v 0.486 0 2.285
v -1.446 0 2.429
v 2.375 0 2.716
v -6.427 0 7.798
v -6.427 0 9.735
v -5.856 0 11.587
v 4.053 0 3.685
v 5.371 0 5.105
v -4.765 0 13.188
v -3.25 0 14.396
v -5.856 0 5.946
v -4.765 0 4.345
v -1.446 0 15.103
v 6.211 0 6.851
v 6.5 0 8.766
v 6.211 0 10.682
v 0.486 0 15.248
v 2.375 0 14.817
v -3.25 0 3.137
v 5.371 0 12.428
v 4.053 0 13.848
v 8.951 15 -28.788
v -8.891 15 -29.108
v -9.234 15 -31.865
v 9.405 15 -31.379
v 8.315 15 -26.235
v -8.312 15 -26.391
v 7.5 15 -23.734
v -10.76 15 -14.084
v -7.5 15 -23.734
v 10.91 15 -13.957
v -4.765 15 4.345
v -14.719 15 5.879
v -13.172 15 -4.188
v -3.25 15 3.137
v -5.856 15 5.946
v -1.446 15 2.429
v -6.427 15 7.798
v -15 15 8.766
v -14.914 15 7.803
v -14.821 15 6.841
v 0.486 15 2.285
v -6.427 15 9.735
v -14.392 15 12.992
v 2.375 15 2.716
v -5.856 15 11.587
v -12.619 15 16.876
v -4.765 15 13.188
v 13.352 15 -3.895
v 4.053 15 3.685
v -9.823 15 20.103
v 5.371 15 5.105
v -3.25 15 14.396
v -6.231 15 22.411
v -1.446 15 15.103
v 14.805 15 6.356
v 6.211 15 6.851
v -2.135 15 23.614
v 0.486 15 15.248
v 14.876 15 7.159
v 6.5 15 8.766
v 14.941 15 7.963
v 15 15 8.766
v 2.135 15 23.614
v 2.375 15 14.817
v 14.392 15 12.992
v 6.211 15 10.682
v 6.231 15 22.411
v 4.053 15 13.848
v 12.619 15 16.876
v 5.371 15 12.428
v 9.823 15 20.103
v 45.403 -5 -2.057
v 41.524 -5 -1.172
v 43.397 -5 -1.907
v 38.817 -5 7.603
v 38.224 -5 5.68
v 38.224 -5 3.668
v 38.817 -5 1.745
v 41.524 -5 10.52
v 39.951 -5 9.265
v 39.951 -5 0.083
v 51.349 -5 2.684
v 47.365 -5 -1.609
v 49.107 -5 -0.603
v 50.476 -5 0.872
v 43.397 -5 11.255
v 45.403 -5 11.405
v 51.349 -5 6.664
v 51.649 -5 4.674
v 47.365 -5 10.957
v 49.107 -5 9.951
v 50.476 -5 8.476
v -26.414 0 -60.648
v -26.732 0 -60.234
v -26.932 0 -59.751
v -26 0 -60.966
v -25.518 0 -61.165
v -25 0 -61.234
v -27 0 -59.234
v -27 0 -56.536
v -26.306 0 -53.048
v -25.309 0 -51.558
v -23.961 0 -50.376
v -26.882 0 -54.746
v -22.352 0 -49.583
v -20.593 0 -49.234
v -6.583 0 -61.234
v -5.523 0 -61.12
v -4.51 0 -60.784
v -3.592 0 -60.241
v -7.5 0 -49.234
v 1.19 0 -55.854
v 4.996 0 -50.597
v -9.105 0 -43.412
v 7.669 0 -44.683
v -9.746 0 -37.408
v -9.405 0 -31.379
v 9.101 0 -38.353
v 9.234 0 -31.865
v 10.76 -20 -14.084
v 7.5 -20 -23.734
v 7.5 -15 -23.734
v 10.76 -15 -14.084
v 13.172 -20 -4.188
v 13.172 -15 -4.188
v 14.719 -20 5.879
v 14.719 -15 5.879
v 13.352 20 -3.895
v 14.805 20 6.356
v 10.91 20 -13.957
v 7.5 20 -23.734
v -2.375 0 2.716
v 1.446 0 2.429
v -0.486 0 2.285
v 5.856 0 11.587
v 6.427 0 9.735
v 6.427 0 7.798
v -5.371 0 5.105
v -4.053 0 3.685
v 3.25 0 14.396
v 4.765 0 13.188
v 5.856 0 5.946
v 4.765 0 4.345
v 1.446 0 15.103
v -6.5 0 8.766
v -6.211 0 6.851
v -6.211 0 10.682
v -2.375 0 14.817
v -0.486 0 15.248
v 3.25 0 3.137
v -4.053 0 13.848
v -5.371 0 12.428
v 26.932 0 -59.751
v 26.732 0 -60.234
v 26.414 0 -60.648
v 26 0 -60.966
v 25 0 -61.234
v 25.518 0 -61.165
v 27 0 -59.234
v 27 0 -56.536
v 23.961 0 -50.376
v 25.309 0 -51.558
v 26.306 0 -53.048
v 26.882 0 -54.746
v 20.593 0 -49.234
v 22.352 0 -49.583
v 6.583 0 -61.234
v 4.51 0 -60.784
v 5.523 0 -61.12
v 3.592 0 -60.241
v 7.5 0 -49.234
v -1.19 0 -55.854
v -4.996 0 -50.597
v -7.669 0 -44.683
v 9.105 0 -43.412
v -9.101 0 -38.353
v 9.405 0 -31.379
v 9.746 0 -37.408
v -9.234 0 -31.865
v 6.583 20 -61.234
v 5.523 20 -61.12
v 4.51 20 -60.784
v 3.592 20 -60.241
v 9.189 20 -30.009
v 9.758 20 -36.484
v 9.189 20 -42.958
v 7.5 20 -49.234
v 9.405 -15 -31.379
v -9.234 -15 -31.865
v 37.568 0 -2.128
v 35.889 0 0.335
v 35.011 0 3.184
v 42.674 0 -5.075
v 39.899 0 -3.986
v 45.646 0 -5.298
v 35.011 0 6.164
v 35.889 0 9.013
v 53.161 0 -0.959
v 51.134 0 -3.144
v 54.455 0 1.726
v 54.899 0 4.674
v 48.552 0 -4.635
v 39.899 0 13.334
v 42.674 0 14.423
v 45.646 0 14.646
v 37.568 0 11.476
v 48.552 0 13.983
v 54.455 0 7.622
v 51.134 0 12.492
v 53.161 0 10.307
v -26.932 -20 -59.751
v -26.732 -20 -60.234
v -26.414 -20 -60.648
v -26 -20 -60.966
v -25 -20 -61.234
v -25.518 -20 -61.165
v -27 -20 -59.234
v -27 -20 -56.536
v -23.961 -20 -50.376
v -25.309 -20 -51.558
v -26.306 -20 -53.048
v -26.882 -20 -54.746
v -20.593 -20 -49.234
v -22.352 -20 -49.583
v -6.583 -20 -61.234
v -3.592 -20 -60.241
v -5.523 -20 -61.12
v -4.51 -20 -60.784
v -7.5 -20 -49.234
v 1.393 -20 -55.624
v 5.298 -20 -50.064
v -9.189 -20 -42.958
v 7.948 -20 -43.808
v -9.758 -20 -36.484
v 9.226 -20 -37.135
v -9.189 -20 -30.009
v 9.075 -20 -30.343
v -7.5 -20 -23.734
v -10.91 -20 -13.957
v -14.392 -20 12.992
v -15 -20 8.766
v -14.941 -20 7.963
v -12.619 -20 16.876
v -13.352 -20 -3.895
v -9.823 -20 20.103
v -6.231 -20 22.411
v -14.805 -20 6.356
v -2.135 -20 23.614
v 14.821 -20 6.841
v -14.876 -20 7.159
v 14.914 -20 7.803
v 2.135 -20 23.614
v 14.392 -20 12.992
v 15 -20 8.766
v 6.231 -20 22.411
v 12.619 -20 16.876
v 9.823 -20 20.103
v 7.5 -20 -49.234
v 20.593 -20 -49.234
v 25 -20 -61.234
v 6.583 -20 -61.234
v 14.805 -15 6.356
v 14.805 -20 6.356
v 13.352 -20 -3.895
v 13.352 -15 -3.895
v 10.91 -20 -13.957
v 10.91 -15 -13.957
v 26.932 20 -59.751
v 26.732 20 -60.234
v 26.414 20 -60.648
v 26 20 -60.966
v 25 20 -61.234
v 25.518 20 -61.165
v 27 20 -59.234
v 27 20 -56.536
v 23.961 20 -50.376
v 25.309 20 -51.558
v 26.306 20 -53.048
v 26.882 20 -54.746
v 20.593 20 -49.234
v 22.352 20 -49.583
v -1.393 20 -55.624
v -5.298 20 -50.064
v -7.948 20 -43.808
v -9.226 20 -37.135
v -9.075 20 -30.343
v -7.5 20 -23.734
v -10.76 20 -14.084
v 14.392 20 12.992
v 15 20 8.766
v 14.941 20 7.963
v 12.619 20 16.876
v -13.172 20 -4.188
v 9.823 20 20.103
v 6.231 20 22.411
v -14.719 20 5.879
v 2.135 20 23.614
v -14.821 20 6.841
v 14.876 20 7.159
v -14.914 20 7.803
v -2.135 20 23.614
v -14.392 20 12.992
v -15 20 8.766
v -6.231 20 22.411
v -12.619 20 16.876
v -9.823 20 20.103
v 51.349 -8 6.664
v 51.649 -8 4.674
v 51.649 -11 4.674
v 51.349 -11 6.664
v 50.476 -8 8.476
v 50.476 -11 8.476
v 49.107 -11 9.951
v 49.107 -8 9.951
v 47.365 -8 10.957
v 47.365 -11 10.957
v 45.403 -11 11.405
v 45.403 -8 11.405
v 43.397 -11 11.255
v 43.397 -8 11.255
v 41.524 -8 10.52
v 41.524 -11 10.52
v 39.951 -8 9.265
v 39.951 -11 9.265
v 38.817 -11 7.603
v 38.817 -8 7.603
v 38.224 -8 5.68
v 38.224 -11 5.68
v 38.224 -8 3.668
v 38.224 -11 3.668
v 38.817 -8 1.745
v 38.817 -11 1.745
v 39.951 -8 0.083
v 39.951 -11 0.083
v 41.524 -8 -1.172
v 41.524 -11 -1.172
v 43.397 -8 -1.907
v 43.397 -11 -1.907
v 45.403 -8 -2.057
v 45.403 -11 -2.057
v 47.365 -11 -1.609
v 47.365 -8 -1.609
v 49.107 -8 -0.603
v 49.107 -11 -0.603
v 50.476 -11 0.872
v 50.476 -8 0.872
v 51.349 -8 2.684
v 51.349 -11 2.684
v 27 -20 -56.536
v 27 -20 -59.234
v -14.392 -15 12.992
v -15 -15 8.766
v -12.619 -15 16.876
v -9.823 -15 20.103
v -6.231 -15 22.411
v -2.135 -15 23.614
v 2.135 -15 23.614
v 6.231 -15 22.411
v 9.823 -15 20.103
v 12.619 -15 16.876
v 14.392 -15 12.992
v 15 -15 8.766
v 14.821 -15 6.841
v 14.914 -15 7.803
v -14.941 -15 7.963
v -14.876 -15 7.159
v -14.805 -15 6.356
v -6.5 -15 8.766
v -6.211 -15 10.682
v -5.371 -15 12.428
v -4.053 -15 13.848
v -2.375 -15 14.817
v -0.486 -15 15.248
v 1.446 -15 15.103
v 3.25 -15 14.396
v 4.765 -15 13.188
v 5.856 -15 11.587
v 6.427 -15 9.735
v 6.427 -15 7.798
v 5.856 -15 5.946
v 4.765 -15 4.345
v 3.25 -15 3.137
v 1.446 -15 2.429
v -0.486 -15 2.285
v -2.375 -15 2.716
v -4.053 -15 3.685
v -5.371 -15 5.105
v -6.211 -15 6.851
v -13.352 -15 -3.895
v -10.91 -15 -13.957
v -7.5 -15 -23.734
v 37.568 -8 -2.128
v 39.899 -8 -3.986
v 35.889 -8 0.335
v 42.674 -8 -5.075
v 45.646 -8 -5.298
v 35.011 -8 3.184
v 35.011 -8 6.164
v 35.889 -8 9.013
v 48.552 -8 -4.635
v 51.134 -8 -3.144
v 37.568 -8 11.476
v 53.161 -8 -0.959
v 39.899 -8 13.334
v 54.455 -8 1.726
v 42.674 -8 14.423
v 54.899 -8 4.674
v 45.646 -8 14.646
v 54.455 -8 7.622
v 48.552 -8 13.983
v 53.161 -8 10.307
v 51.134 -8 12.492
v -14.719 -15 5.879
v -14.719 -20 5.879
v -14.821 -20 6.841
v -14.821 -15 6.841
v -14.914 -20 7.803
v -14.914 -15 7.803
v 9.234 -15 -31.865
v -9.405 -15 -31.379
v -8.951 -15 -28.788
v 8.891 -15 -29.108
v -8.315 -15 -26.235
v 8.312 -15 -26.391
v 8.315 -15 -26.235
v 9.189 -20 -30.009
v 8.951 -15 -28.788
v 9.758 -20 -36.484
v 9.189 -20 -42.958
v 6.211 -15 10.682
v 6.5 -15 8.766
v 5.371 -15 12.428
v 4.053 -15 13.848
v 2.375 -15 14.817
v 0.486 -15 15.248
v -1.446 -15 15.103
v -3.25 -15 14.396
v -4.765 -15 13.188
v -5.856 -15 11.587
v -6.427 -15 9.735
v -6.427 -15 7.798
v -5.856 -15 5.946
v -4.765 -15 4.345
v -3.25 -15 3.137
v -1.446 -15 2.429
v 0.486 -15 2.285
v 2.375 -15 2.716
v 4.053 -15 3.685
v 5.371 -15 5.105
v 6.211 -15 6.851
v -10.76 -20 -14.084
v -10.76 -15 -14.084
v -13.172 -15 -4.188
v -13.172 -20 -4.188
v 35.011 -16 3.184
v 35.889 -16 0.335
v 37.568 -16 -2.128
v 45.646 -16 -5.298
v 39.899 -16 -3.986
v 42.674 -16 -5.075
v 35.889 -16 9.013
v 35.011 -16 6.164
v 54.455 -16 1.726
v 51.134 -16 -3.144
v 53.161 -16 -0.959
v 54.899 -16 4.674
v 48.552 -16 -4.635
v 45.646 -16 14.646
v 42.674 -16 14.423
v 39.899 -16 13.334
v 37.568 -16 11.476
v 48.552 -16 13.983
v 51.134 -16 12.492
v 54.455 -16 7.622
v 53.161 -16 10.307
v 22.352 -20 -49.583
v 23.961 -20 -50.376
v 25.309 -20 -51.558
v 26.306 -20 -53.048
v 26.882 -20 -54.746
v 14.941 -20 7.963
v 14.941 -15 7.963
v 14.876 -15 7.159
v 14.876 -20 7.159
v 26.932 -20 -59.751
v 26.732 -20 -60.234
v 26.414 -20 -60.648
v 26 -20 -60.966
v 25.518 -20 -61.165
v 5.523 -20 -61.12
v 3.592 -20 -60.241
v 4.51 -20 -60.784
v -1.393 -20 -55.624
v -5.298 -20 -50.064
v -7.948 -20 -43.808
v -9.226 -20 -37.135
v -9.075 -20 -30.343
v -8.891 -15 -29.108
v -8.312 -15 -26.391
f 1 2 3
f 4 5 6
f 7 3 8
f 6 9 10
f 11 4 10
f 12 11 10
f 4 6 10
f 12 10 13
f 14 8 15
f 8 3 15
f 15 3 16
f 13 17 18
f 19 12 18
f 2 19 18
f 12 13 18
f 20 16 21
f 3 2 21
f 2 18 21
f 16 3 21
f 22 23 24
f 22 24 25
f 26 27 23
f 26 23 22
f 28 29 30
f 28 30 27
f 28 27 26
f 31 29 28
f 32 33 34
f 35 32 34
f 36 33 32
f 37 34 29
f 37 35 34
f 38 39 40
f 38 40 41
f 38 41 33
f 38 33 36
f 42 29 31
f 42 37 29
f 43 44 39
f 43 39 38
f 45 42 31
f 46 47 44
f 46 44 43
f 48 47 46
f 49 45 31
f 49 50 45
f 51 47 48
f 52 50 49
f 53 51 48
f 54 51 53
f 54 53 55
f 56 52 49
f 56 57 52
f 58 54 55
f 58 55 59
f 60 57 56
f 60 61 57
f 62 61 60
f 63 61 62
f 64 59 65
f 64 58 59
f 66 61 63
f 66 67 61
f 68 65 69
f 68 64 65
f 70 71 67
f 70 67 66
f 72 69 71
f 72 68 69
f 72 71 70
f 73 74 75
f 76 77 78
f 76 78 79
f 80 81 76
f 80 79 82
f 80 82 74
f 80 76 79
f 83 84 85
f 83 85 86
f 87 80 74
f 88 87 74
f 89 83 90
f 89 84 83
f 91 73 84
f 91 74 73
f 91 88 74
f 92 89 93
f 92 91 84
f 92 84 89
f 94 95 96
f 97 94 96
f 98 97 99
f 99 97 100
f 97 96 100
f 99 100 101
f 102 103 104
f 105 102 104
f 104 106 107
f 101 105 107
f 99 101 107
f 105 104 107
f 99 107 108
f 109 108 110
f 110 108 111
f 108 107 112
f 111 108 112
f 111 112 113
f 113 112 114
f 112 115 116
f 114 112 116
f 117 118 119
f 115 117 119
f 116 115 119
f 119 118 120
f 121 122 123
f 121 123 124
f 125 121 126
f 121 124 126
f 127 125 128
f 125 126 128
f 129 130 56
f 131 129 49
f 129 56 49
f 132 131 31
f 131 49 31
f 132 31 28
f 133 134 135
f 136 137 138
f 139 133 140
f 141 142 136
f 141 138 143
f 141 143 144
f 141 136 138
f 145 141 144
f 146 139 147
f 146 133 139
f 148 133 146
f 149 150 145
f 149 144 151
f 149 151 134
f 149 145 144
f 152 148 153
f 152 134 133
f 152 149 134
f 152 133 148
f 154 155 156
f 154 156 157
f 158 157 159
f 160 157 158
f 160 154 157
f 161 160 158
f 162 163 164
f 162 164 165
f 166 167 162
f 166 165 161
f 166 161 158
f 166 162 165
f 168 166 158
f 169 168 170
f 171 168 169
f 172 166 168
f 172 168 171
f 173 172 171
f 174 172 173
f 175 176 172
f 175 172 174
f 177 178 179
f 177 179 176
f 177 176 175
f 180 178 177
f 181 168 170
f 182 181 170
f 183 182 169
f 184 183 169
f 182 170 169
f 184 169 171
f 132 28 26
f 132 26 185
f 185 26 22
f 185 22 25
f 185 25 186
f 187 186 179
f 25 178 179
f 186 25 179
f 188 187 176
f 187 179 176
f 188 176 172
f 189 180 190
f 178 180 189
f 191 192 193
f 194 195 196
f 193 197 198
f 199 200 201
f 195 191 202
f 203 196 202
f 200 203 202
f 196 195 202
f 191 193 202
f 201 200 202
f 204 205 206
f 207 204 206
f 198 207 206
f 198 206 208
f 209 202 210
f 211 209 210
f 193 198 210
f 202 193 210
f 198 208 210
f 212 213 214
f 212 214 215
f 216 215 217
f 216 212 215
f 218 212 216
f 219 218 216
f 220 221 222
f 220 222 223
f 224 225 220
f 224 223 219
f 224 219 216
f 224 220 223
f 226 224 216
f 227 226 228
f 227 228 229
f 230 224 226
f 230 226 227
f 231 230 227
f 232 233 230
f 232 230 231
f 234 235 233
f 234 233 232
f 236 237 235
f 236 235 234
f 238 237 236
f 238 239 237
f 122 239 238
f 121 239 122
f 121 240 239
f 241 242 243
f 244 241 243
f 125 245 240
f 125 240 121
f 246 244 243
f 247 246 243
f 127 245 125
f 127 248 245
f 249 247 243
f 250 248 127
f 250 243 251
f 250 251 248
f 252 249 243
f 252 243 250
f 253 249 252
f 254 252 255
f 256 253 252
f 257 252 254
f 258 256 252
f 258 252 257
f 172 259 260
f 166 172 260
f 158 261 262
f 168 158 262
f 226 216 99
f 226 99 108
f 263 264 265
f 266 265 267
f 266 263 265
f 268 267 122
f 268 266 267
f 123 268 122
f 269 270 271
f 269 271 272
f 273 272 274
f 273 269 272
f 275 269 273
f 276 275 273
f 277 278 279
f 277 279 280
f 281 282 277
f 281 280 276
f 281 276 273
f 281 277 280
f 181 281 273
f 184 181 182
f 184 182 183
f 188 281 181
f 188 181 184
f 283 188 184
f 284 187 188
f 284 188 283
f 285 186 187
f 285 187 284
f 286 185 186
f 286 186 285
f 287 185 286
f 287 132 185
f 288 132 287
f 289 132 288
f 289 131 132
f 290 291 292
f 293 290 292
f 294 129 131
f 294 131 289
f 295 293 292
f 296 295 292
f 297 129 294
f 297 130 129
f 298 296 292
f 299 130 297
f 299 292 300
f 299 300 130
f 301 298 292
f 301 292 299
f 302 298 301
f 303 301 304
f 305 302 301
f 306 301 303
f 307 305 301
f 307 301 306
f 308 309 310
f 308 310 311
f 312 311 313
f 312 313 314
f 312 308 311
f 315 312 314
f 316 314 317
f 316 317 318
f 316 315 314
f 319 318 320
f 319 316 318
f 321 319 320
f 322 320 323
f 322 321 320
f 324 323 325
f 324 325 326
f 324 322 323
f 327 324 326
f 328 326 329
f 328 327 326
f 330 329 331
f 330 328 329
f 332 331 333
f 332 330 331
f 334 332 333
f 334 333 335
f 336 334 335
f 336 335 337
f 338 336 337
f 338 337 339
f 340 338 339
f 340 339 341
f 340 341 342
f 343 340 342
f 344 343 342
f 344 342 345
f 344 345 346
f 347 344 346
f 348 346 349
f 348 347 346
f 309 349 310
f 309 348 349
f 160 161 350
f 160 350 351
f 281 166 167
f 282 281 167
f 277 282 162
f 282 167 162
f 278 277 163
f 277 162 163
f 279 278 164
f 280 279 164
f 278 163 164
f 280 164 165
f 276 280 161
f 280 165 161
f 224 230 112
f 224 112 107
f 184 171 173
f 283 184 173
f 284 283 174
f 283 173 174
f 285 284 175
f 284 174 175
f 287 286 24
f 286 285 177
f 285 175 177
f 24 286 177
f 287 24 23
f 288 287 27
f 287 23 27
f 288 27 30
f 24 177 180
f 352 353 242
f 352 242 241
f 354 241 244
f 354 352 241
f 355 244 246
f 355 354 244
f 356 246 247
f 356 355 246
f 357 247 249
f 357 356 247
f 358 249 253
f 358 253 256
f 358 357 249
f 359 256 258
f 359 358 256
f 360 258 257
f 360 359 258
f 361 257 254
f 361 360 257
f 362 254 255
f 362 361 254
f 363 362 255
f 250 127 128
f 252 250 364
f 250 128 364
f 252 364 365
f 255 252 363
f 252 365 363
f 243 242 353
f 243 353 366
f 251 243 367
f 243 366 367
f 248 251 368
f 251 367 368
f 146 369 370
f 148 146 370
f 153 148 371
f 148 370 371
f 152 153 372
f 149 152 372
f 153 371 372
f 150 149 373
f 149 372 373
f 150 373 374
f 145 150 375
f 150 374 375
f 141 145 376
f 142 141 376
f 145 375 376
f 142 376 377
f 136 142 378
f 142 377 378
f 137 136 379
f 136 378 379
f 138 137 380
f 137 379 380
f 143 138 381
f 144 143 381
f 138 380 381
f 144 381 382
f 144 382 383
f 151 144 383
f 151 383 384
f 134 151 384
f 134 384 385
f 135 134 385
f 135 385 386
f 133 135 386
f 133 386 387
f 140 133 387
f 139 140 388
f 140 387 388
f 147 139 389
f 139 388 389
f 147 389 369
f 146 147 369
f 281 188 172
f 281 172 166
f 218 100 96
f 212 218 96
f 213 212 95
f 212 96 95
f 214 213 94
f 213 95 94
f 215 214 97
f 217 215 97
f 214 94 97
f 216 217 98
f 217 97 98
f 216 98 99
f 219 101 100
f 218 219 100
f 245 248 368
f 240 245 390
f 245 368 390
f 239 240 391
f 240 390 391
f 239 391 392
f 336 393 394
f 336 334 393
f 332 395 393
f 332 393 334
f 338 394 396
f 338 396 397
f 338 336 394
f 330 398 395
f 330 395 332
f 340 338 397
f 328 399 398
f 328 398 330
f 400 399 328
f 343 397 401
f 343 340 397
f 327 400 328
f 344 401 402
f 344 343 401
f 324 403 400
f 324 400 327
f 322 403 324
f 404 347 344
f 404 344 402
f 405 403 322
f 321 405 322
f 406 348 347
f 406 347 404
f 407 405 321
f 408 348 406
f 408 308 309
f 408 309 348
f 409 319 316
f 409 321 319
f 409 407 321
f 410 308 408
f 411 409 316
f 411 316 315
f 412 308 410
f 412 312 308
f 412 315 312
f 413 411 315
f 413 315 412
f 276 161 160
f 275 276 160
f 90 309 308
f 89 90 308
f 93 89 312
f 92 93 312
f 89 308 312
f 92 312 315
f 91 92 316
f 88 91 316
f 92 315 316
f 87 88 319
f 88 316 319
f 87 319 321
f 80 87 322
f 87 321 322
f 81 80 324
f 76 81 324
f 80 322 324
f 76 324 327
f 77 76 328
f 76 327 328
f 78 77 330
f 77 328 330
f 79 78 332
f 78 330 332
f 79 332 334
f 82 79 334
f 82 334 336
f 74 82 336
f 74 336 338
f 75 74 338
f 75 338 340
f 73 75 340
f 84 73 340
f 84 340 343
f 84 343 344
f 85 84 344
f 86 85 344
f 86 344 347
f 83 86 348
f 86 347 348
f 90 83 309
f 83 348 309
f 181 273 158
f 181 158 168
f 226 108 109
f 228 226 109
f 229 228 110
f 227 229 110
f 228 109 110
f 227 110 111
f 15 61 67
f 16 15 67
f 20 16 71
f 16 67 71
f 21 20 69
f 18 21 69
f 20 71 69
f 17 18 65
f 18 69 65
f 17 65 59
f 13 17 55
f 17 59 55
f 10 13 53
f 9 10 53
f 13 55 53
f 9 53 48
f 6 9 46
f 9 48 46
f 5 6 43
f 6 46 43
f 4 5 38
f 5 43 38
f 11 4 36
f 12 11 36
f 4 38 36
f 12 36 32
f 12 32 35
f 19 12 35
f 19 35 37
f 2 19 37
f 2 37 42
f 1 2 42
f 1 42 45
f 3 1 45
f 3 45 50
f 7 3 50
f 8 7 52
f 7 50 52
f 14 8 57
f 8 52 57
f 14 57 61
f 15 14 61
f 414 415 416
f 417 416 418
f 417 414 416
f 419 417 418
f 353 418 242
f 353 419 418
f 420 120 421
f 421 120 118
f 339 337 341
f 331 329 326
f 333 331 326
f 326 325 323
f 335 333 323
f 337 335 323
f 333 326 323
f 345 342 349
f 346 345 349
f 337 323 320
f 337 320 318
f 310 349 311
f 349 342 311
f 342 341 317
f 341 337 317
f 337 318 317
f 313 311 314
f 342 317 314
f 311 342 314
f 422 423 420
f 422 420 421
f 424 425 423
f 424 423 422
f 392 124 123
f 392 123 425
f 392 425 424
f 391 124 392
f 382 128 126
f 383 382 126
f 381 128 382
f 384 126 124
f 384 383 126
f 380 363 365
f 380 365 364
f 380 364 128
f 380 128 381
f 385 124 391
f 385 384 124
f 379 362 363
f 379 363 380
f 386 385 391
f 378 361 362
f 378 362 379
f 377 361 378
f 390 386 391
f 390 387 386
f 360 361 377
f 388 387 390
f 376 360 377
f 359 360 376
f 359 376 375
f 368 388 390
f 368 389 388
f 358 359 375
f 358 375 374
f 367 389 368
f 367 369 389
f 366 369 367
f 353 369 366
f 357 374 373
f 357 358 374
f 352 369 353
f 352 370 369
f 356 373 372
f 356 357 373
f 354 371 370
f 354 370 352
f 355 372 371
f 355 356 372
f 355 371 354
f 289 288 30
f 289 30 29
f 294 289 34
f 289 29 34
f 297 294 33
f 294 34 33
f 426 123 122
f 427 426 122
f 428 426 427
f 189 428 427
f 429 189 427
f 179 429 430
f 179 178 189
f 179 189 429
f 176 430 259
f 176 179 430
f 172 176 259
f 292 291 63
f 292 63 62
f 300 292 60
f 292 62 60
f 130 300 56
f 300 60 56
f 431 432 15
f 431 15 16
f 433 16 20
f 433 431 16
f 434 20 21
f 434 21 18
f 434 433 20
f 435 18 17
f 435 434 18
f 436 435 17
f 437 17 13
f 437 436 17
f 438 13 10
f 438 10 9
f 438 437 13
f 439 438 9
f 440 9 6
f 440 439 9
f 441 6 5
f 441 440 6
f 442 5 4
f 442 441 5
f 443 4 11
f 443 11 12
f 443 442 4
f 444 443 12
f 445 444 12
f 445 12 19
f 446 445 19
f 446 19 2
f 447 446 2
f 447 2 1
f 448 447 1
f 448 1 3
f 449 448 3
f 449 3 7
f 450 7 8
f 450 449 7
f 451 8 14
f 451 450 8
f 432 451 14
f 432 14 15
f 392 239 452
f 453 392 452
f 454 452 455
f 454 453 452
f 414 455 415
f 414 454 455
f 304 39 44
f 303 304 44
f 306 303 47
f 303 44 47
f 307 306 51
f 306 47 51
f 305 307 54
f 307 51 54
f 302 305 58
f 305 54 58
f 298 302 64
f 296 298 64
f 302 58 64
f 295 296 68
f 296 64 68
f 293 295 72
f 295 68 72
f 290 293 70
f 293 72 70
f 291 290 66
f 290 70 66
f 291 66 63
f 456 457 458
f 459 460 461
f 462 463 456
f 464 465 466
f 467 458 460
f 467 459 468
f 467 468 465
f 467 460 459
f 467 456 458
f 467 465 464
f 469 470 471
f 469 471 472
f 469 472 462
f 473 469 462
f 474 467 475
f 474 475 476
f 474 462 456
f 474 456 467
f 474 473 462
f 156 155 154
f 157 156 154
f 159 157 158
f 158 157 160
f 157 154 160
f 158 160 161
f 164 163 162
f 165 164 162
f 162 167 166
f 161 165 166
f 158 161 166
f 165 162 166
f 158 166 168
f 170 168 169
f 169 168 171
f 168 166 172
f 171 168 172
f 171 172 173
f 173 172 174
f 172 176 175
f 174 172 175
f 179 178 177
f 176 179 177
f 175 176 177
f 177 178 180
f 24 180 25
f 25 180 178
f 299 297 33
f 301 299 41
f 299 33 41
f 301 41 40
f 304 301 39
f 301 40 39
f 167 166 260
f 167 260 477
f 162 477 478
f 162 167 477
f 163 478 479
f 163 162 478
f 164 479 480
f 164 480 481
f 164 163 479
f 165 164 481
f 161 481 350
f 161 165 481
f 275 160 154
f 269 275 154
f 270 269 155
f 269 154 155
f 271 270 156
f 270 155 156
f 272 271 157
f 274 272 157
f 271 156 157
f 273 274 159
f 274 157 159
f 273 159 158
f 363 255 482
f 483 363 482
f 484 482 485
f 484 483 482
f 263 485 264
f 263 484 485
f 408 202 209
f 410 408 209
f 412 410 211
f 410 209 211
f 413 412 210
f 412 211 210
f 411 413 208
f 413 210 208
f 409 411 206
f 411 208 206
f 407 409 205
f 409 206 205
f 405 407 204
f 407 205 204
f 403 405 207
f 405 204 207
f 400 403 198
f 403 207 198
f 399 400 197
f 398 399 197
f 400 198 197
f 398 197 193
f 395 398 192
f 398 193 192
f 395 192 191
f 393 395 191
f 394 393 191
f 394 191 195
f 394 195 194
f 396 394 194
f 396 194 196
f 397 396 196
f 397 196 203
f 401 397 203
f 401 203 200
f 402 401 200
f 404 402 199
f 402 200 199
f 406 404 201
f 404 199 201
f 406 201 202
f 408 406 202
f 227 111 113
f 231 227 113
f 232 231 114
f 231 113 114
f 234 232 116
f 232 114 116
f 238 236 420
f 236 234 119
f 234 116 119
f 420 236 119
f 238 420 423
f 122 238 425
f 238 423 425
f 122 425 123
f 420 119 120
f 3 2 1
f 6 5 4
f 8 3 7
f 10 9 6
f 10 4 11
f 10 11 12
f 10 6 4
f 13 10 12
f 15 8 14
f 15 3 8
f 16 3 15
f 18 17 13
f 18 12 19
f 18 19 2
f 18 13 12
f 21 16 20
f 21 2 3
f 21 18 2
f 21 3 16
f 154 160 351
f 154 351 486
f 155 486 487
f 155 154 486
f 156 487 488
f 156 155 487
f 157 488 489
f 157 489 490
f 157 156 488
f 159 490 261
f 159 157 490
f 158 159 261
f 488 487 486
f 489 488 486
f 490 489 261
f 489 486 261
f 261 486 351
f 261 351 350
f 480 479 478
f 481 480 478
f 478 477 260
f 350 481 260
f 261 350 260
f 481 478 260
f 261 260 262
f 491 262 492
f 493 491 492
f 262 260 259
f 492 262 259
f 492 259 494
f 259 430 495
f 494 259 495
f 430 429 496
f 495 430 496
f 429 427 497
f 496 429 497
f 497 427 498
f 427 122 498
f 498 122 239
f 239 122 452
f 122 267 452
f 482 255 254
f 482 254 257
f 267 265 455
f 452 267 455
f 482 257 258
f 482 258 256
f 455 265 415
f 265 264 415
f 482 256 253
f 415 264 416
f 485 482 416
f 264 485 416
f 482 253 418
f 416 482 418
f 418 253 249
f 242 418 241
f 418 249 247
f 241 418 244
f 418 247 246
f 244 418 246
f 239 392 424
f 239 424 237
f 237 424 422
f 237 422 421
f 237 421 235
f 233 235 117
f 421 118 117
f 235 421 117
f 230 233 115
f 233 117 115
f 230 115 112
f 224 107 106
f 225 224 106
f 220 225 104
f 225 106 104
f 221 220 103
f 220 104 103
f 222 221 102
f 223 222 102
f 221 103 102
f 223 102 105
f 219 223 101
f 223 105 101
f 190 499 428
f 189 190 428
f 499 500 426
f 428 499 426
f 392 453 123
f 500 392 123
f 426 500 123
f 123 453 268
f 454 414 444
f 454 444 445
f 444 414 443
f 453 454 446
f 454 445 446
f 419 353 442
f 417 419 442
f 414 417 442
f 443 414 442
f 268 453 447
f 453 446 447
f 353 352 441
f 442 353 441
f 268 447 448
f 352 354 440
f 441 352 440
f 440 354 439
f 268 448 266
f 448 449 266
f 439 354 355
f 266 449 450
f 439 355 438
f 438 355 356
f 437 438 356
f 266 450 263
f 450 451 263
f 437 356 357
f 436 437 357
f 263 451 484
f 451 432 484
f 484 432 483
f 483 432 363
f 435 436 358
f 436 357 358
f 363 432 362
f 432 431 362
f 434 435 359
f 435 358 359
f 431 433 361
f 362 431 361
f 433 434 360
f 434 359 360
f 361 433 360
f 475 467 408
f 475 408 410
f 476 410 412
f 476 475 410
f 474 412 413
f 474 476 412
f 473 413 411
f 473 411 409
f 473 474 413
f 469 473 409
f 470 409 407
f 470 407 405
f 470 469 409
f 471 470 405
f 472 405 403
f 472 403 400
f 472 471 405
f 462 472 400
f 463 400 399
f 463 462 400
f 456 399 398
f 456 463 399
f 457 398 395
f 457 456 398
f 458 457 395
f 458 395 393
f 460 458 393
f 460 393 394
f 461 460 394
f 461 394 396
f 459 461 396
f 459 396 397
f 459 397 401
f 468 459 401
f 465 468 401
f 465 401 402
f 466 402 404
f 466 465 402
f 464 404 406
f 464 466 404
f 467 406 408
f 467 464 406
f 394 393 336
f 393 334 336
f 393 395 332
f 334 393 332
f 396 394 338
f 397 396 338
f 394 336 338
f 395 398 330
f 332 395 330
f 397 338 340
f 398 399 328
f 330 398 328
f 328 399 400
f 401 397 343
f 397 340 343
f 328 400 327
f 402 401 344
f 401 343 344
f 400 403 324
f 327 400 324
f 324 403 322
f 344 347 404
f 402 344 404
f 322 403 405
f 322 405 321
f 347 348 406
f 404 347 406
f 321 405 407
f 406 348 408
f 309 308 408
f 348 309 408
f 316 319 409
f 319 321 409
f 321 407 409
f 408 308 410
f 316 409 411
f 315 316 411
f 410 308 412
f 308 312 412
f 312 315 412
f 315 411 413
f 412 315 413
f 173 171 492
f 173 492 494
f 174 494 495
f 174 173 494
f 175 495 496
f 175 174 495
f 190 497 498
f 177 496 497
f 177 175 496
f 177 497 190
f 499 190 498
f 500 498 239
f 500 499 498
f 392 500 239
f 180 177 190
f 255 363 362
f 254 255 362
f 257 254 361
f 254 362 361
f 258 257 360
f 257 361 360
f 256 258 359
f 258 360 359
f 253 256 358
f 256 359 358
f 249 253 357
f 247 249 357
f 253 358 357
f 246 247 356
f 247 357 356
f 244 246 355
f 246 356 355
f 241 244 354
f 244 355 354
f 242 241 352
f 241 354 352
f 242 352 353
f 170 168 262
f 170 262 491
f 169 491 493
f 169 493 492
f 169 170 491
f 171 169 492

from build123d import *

# Parameters (mm, degrees)
F1_DEPTH = 20
F3_DEPTH = 15
F4_R     = 6.5
F5_DEPTH = 15
F6_R     = 10
F7_DEPTH = 8
F8_R     = 6.75
F9_DEPTH = 3


with BuildPart() as f1:
    # F0 (on Front) → F1 (new body)
    with BuildSketch(Plane.XZ):
        with BuildLine():
            ThreePointArc((7.5, -23.7335821161), (12.0730484615, -9.1622264301), (14.7194400461, 5.8788436895))
            ThreePointArc((14.7194400461, 5.8788436895), (14.8686238637, 7.3217656795), (15, 8.7664178839))
            ThreePointArc((15, 8.7664178839), (0, 23.7664178839), (-15, 8.7664178839))
            ThreePointArc((-15, 8.7664178839), (-14.9094099416, 7.5608277396), (-14.8051190773, 6.3563454564))
            ThreePointArc((-14.8051190773, 6.3563454564), (-12.2536543916, -8.9559379835), (-7.5, -23.7335821161))
            ThreePointArc((-7.5, -23.7335821161), (-9.7576147968, -36.4835821161), (-7.5, -49.2335821161))
            Line((-7.5, -49.2335821161), (-19.6980078494, -49.2335821161))
            Line((-19.6980078494, -49.2335821161), (-20.5934010505, -49.2335821161))
            ThreePointArc((-20.5934010505, -49.2335821161), (-25.3089926158, -51.5577281047), (-27, -56.5355742668))
            Line((-27, -56.5355742668), (-27, -59.2335821161))
            ThreePointArc((-27, -59.2335821161), (-26.4142135624, -60.6477956785), (-25, -61.2335821161))
            Line((-25, -61.2335821161), (-6.5831534378, -61.2335821161))
            ThreePointArc((-6.5831534378, -61.2335821161), (-5.0075024369, -60.9788243569), (-3.5924151633, -60.2405116855))
            ThreePointArc((-3.5924151633, -60.2405116855), (7.9484414636, -43.8084856455), (7.5, -23.7335821161))
        make_face()
    extrude(amount=F1_DEPTH)

    # F2 (on face) → F3 (cut)
    with BuildSketch(Plane(origin=(0, 0, 0), x_dir=(-1, 0, 0), z_dir=(0, 1, 0))):
        with BuildLine():
            ThreePointArc((15, 8.7664178839), (10.6066017178, 19.3730196017), (0, 23.7664178839))
            ThreePointArc((0, 23.7664178839), (-10.6066017178, 19.3730196017), (-15, 8.7664178839))
            ThreePointArc((-15, 8.7664178839), (-12.4079431857, -7.7507997744), (-7.5, -23.7335821161))
            ThreePointArc((-7.5, -23.7335821161), (-8.6307146126, -27.7430675083), (-9.2339552182, -31.8650317751))
            Line((-9.2339552182, -31.8650317751), (9.4051248205, -31.3793644283))
            ThreePointArc((9.4051248205, -31.3793644283), (8.6559449142, -27.5057957822), (7.5, -23.7335821161))
            ThreePointArc((7.5, -23.7335821161), (12.532199405, -7.7794742865), (15, 8.7664178839))
        make_face()
    extrude(amount=-F3_DEPTH, mode=Mode.SUBTRACT)

    # F4 (on face) → F5 (join)
    with BuildSketch(Plane(origin=(0, -15, 0), x_dir=(-1, 0, 0), z_dir=(0, 1, 0))):
        with Locations((0, 8.7664178839)):
            Circle(F4_R)
    extrude(amount=F5_DEPTH)


with BuildPart() as f7:
    # F6 (on Front) → F7 (new body)
    with BuildSketch(Plane.XZ):
        with Locations((44.8988303542, 4.6740109101)):
            Circle(F6_R)
    extrude(amount=F7_DEPTH)

    # F8 (on face) → F9 (cut)
    with BuildSketch(Plane.XZ.offset(8)):
        with Locations((44.8988303542, 4.6740109101)):
            Circle(F8_R)
    extrude(amount=-F9_DEPTH, mode=Mode.SUBTRACT)


with BuildPart() as f10_1:
    # F10: instance of F1
    add(f1.part.mirror(Plane.YZ))


with BuildPart() as f11_1:
    # F11: instance of F10_1
    add(f10_1.part.mirror(Plane(origin=(0, 0, 8.7664178839), x_dir=(-1, 0, 0), z_dir=(0, 1, 0))))


with BuildPart() as f12_1:
    # F12: instance of F7
    add(f7.part.mirror(Plane(origin=(44.8988303542, -8, 4.6740109101), x_dir=(1, 0, 0), z_dir=(0, -1, 0))))


solid = Compound([f1.part, f7.part, f10_1.part, f11_1.part, f12_1.part])
